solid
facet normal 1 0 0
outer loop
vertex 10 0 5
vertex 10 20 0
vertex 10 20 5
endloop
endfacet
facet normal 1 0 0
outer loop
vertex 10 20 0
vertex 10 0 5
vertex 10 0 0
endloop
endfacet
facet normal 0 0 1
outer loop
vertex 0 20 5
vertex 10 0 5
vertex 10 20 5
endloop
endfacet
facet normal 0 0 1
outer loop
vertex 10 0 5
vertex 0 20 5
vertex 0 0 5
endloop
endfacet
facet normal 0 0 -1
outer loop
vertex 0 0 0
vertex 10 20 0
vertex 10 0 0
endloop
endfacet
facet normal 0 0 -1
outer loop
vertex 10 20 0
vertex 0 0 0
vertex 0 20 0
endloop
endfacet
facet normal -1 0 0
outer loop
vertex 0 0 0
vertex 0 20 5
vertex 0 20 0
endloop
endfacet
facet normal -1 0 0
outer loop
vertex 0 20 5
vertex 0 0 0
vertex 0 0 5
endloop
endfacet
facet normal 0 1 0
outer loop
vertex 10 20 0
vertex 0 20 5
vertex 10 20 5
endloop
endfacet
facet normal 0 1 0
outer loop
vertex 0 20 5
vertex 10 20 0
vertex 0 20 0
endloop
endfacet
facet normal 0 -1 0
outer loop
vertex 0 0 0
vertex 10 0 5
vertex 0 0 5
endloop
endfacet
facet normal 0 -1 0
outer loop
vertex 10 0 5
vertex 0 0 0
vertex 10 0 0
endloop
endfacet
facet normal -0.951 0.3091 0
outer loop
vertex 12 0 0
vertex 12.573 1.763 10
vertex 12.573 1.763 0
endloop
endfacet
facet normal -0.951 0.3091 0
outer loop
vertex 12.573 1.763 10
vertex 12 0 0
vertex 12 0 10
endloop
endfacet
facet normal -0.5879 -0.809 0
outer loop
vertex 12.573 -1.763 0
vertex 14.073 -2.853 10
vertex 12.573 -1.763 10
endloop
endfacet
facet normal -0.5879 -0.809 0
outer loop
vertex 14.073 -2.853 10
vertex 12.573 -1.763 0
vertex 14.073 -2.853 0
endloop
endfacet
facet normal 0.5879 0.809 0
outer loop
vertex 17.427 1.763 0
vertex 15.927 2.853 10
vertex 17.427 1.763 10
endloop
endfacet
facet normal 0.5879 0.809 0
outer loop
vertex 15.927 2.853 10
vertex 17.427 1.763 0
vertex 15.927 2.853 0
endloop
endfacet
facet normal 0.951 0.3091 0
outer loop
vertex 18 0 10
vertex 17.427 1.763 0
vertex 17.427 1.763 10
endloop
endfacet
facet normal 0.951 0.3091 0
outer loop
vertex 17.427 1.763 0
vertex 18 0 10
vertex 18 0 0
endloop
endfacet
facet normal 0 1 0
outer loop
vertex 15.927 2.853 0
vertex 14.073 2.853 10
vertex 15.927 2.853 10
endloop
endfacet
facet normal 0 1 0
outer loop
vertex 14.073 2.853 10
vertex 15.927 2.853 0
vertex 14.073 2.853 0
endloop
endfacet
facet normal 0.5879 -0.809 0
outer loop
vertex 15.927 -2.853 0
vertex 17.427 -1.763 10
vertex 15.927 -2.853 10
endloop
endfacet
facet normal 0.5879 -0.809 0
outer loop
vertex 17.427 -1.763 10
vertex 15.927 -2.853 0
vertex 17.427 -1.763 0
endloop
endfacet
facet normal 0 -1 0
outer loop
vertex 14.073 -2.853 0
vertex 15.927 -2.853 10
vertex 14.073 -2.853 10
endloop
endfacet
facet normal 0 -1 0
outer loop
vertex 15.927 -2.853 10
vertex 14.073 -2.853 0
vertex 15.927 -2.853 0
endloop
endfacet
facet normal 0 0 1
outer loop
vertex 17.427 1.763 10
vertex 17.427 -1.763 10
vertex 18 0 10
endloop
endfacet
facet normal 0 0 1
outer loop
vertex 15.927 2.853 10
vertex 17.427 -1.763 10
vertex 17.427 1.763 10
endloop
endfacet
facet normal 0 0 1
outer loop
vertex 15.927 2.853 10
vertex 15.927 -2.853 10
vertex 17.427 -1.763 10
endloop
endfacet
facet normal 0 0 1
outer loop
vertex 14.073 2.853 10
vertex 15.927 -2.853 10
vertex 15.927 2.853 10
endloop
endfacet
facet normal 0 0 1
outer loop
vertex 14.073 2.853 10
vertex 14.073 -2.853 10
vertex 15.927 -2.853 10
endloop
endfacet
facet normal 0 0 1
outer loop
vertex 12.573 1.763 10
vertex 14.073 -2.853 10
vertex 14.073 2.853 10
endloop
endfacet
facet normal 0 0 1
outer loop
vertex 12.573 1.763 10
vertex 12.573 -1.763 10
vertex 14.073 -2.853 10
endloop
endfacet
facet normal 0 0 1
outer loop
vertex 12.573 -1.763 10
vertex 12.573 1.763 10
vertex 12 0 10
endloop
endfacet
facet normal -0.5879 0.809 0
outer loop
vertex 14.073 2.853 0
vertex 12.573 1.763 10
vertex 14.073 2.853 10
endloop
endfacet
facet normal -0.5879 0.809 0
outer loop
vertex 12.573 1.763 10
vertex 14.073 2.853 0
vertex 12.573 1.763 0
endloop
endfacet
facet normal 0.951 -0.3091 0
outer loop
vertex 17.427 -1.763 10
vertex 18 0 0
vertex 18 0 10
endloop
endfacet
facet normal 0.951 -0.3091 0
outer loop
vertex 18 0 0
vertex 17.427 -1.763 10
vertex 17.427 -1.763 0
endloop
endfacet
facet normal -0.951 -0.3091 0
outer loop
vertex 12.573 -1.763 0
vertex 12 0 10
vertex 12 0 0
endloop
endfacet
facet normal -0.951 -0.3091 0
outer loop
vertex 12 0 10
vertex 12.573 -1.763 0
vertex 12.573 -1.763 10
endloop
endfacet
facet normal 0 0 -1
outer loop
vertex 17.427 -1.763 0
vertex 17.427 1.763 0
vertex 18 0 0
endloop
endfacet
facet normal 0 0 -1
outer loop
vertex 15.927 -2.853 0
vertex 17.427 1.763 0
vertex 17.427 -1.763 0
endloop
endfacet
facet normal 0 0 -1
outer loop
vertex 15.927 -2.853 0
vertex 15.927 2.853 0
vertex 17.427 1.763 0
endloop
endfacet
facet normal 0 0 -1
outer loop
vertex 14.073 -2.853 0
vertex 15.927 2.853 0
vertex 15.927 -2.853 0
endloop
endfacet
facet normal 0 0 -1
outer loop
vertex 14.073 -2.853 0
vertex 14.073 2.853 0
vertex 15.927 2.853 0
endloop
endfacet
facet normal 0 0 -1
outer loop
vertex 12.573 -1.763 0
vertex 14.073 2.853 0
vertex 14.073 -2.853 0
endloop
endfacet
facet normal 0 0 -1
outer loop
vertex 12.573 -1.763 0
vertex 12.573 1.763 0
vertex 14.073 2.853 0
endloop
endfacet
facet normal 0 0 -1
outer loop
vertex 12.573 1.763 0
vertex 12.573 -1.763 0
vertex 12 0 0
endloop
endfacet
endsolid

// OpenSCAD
// Generated by SolidPython 1.1.3 on 2025-02-27 16:47:54


union() {
	cube(size = [10, 20, 5]);
	translate(v = [15, 0, 0]) {
		cylinder(h = 10, r = 3);
	}
}
/***********************************************
*********      SolidPython code:      **********
************************************************
 
from solid import *
from solid.utils import *  # Hilfsfunktionen (z.B. `up()`, `right()`)

cube = cube([10, 20, 5])
cylinder = translate([15, 0, 0])(cylinder(r=3, h=10))

# Kombiniere Objekte
model = union()(cube, cylinder)

# Exportiere nach .scad
scad_render_to_file(model, "mechanism.scad") 
 
************************************************/
